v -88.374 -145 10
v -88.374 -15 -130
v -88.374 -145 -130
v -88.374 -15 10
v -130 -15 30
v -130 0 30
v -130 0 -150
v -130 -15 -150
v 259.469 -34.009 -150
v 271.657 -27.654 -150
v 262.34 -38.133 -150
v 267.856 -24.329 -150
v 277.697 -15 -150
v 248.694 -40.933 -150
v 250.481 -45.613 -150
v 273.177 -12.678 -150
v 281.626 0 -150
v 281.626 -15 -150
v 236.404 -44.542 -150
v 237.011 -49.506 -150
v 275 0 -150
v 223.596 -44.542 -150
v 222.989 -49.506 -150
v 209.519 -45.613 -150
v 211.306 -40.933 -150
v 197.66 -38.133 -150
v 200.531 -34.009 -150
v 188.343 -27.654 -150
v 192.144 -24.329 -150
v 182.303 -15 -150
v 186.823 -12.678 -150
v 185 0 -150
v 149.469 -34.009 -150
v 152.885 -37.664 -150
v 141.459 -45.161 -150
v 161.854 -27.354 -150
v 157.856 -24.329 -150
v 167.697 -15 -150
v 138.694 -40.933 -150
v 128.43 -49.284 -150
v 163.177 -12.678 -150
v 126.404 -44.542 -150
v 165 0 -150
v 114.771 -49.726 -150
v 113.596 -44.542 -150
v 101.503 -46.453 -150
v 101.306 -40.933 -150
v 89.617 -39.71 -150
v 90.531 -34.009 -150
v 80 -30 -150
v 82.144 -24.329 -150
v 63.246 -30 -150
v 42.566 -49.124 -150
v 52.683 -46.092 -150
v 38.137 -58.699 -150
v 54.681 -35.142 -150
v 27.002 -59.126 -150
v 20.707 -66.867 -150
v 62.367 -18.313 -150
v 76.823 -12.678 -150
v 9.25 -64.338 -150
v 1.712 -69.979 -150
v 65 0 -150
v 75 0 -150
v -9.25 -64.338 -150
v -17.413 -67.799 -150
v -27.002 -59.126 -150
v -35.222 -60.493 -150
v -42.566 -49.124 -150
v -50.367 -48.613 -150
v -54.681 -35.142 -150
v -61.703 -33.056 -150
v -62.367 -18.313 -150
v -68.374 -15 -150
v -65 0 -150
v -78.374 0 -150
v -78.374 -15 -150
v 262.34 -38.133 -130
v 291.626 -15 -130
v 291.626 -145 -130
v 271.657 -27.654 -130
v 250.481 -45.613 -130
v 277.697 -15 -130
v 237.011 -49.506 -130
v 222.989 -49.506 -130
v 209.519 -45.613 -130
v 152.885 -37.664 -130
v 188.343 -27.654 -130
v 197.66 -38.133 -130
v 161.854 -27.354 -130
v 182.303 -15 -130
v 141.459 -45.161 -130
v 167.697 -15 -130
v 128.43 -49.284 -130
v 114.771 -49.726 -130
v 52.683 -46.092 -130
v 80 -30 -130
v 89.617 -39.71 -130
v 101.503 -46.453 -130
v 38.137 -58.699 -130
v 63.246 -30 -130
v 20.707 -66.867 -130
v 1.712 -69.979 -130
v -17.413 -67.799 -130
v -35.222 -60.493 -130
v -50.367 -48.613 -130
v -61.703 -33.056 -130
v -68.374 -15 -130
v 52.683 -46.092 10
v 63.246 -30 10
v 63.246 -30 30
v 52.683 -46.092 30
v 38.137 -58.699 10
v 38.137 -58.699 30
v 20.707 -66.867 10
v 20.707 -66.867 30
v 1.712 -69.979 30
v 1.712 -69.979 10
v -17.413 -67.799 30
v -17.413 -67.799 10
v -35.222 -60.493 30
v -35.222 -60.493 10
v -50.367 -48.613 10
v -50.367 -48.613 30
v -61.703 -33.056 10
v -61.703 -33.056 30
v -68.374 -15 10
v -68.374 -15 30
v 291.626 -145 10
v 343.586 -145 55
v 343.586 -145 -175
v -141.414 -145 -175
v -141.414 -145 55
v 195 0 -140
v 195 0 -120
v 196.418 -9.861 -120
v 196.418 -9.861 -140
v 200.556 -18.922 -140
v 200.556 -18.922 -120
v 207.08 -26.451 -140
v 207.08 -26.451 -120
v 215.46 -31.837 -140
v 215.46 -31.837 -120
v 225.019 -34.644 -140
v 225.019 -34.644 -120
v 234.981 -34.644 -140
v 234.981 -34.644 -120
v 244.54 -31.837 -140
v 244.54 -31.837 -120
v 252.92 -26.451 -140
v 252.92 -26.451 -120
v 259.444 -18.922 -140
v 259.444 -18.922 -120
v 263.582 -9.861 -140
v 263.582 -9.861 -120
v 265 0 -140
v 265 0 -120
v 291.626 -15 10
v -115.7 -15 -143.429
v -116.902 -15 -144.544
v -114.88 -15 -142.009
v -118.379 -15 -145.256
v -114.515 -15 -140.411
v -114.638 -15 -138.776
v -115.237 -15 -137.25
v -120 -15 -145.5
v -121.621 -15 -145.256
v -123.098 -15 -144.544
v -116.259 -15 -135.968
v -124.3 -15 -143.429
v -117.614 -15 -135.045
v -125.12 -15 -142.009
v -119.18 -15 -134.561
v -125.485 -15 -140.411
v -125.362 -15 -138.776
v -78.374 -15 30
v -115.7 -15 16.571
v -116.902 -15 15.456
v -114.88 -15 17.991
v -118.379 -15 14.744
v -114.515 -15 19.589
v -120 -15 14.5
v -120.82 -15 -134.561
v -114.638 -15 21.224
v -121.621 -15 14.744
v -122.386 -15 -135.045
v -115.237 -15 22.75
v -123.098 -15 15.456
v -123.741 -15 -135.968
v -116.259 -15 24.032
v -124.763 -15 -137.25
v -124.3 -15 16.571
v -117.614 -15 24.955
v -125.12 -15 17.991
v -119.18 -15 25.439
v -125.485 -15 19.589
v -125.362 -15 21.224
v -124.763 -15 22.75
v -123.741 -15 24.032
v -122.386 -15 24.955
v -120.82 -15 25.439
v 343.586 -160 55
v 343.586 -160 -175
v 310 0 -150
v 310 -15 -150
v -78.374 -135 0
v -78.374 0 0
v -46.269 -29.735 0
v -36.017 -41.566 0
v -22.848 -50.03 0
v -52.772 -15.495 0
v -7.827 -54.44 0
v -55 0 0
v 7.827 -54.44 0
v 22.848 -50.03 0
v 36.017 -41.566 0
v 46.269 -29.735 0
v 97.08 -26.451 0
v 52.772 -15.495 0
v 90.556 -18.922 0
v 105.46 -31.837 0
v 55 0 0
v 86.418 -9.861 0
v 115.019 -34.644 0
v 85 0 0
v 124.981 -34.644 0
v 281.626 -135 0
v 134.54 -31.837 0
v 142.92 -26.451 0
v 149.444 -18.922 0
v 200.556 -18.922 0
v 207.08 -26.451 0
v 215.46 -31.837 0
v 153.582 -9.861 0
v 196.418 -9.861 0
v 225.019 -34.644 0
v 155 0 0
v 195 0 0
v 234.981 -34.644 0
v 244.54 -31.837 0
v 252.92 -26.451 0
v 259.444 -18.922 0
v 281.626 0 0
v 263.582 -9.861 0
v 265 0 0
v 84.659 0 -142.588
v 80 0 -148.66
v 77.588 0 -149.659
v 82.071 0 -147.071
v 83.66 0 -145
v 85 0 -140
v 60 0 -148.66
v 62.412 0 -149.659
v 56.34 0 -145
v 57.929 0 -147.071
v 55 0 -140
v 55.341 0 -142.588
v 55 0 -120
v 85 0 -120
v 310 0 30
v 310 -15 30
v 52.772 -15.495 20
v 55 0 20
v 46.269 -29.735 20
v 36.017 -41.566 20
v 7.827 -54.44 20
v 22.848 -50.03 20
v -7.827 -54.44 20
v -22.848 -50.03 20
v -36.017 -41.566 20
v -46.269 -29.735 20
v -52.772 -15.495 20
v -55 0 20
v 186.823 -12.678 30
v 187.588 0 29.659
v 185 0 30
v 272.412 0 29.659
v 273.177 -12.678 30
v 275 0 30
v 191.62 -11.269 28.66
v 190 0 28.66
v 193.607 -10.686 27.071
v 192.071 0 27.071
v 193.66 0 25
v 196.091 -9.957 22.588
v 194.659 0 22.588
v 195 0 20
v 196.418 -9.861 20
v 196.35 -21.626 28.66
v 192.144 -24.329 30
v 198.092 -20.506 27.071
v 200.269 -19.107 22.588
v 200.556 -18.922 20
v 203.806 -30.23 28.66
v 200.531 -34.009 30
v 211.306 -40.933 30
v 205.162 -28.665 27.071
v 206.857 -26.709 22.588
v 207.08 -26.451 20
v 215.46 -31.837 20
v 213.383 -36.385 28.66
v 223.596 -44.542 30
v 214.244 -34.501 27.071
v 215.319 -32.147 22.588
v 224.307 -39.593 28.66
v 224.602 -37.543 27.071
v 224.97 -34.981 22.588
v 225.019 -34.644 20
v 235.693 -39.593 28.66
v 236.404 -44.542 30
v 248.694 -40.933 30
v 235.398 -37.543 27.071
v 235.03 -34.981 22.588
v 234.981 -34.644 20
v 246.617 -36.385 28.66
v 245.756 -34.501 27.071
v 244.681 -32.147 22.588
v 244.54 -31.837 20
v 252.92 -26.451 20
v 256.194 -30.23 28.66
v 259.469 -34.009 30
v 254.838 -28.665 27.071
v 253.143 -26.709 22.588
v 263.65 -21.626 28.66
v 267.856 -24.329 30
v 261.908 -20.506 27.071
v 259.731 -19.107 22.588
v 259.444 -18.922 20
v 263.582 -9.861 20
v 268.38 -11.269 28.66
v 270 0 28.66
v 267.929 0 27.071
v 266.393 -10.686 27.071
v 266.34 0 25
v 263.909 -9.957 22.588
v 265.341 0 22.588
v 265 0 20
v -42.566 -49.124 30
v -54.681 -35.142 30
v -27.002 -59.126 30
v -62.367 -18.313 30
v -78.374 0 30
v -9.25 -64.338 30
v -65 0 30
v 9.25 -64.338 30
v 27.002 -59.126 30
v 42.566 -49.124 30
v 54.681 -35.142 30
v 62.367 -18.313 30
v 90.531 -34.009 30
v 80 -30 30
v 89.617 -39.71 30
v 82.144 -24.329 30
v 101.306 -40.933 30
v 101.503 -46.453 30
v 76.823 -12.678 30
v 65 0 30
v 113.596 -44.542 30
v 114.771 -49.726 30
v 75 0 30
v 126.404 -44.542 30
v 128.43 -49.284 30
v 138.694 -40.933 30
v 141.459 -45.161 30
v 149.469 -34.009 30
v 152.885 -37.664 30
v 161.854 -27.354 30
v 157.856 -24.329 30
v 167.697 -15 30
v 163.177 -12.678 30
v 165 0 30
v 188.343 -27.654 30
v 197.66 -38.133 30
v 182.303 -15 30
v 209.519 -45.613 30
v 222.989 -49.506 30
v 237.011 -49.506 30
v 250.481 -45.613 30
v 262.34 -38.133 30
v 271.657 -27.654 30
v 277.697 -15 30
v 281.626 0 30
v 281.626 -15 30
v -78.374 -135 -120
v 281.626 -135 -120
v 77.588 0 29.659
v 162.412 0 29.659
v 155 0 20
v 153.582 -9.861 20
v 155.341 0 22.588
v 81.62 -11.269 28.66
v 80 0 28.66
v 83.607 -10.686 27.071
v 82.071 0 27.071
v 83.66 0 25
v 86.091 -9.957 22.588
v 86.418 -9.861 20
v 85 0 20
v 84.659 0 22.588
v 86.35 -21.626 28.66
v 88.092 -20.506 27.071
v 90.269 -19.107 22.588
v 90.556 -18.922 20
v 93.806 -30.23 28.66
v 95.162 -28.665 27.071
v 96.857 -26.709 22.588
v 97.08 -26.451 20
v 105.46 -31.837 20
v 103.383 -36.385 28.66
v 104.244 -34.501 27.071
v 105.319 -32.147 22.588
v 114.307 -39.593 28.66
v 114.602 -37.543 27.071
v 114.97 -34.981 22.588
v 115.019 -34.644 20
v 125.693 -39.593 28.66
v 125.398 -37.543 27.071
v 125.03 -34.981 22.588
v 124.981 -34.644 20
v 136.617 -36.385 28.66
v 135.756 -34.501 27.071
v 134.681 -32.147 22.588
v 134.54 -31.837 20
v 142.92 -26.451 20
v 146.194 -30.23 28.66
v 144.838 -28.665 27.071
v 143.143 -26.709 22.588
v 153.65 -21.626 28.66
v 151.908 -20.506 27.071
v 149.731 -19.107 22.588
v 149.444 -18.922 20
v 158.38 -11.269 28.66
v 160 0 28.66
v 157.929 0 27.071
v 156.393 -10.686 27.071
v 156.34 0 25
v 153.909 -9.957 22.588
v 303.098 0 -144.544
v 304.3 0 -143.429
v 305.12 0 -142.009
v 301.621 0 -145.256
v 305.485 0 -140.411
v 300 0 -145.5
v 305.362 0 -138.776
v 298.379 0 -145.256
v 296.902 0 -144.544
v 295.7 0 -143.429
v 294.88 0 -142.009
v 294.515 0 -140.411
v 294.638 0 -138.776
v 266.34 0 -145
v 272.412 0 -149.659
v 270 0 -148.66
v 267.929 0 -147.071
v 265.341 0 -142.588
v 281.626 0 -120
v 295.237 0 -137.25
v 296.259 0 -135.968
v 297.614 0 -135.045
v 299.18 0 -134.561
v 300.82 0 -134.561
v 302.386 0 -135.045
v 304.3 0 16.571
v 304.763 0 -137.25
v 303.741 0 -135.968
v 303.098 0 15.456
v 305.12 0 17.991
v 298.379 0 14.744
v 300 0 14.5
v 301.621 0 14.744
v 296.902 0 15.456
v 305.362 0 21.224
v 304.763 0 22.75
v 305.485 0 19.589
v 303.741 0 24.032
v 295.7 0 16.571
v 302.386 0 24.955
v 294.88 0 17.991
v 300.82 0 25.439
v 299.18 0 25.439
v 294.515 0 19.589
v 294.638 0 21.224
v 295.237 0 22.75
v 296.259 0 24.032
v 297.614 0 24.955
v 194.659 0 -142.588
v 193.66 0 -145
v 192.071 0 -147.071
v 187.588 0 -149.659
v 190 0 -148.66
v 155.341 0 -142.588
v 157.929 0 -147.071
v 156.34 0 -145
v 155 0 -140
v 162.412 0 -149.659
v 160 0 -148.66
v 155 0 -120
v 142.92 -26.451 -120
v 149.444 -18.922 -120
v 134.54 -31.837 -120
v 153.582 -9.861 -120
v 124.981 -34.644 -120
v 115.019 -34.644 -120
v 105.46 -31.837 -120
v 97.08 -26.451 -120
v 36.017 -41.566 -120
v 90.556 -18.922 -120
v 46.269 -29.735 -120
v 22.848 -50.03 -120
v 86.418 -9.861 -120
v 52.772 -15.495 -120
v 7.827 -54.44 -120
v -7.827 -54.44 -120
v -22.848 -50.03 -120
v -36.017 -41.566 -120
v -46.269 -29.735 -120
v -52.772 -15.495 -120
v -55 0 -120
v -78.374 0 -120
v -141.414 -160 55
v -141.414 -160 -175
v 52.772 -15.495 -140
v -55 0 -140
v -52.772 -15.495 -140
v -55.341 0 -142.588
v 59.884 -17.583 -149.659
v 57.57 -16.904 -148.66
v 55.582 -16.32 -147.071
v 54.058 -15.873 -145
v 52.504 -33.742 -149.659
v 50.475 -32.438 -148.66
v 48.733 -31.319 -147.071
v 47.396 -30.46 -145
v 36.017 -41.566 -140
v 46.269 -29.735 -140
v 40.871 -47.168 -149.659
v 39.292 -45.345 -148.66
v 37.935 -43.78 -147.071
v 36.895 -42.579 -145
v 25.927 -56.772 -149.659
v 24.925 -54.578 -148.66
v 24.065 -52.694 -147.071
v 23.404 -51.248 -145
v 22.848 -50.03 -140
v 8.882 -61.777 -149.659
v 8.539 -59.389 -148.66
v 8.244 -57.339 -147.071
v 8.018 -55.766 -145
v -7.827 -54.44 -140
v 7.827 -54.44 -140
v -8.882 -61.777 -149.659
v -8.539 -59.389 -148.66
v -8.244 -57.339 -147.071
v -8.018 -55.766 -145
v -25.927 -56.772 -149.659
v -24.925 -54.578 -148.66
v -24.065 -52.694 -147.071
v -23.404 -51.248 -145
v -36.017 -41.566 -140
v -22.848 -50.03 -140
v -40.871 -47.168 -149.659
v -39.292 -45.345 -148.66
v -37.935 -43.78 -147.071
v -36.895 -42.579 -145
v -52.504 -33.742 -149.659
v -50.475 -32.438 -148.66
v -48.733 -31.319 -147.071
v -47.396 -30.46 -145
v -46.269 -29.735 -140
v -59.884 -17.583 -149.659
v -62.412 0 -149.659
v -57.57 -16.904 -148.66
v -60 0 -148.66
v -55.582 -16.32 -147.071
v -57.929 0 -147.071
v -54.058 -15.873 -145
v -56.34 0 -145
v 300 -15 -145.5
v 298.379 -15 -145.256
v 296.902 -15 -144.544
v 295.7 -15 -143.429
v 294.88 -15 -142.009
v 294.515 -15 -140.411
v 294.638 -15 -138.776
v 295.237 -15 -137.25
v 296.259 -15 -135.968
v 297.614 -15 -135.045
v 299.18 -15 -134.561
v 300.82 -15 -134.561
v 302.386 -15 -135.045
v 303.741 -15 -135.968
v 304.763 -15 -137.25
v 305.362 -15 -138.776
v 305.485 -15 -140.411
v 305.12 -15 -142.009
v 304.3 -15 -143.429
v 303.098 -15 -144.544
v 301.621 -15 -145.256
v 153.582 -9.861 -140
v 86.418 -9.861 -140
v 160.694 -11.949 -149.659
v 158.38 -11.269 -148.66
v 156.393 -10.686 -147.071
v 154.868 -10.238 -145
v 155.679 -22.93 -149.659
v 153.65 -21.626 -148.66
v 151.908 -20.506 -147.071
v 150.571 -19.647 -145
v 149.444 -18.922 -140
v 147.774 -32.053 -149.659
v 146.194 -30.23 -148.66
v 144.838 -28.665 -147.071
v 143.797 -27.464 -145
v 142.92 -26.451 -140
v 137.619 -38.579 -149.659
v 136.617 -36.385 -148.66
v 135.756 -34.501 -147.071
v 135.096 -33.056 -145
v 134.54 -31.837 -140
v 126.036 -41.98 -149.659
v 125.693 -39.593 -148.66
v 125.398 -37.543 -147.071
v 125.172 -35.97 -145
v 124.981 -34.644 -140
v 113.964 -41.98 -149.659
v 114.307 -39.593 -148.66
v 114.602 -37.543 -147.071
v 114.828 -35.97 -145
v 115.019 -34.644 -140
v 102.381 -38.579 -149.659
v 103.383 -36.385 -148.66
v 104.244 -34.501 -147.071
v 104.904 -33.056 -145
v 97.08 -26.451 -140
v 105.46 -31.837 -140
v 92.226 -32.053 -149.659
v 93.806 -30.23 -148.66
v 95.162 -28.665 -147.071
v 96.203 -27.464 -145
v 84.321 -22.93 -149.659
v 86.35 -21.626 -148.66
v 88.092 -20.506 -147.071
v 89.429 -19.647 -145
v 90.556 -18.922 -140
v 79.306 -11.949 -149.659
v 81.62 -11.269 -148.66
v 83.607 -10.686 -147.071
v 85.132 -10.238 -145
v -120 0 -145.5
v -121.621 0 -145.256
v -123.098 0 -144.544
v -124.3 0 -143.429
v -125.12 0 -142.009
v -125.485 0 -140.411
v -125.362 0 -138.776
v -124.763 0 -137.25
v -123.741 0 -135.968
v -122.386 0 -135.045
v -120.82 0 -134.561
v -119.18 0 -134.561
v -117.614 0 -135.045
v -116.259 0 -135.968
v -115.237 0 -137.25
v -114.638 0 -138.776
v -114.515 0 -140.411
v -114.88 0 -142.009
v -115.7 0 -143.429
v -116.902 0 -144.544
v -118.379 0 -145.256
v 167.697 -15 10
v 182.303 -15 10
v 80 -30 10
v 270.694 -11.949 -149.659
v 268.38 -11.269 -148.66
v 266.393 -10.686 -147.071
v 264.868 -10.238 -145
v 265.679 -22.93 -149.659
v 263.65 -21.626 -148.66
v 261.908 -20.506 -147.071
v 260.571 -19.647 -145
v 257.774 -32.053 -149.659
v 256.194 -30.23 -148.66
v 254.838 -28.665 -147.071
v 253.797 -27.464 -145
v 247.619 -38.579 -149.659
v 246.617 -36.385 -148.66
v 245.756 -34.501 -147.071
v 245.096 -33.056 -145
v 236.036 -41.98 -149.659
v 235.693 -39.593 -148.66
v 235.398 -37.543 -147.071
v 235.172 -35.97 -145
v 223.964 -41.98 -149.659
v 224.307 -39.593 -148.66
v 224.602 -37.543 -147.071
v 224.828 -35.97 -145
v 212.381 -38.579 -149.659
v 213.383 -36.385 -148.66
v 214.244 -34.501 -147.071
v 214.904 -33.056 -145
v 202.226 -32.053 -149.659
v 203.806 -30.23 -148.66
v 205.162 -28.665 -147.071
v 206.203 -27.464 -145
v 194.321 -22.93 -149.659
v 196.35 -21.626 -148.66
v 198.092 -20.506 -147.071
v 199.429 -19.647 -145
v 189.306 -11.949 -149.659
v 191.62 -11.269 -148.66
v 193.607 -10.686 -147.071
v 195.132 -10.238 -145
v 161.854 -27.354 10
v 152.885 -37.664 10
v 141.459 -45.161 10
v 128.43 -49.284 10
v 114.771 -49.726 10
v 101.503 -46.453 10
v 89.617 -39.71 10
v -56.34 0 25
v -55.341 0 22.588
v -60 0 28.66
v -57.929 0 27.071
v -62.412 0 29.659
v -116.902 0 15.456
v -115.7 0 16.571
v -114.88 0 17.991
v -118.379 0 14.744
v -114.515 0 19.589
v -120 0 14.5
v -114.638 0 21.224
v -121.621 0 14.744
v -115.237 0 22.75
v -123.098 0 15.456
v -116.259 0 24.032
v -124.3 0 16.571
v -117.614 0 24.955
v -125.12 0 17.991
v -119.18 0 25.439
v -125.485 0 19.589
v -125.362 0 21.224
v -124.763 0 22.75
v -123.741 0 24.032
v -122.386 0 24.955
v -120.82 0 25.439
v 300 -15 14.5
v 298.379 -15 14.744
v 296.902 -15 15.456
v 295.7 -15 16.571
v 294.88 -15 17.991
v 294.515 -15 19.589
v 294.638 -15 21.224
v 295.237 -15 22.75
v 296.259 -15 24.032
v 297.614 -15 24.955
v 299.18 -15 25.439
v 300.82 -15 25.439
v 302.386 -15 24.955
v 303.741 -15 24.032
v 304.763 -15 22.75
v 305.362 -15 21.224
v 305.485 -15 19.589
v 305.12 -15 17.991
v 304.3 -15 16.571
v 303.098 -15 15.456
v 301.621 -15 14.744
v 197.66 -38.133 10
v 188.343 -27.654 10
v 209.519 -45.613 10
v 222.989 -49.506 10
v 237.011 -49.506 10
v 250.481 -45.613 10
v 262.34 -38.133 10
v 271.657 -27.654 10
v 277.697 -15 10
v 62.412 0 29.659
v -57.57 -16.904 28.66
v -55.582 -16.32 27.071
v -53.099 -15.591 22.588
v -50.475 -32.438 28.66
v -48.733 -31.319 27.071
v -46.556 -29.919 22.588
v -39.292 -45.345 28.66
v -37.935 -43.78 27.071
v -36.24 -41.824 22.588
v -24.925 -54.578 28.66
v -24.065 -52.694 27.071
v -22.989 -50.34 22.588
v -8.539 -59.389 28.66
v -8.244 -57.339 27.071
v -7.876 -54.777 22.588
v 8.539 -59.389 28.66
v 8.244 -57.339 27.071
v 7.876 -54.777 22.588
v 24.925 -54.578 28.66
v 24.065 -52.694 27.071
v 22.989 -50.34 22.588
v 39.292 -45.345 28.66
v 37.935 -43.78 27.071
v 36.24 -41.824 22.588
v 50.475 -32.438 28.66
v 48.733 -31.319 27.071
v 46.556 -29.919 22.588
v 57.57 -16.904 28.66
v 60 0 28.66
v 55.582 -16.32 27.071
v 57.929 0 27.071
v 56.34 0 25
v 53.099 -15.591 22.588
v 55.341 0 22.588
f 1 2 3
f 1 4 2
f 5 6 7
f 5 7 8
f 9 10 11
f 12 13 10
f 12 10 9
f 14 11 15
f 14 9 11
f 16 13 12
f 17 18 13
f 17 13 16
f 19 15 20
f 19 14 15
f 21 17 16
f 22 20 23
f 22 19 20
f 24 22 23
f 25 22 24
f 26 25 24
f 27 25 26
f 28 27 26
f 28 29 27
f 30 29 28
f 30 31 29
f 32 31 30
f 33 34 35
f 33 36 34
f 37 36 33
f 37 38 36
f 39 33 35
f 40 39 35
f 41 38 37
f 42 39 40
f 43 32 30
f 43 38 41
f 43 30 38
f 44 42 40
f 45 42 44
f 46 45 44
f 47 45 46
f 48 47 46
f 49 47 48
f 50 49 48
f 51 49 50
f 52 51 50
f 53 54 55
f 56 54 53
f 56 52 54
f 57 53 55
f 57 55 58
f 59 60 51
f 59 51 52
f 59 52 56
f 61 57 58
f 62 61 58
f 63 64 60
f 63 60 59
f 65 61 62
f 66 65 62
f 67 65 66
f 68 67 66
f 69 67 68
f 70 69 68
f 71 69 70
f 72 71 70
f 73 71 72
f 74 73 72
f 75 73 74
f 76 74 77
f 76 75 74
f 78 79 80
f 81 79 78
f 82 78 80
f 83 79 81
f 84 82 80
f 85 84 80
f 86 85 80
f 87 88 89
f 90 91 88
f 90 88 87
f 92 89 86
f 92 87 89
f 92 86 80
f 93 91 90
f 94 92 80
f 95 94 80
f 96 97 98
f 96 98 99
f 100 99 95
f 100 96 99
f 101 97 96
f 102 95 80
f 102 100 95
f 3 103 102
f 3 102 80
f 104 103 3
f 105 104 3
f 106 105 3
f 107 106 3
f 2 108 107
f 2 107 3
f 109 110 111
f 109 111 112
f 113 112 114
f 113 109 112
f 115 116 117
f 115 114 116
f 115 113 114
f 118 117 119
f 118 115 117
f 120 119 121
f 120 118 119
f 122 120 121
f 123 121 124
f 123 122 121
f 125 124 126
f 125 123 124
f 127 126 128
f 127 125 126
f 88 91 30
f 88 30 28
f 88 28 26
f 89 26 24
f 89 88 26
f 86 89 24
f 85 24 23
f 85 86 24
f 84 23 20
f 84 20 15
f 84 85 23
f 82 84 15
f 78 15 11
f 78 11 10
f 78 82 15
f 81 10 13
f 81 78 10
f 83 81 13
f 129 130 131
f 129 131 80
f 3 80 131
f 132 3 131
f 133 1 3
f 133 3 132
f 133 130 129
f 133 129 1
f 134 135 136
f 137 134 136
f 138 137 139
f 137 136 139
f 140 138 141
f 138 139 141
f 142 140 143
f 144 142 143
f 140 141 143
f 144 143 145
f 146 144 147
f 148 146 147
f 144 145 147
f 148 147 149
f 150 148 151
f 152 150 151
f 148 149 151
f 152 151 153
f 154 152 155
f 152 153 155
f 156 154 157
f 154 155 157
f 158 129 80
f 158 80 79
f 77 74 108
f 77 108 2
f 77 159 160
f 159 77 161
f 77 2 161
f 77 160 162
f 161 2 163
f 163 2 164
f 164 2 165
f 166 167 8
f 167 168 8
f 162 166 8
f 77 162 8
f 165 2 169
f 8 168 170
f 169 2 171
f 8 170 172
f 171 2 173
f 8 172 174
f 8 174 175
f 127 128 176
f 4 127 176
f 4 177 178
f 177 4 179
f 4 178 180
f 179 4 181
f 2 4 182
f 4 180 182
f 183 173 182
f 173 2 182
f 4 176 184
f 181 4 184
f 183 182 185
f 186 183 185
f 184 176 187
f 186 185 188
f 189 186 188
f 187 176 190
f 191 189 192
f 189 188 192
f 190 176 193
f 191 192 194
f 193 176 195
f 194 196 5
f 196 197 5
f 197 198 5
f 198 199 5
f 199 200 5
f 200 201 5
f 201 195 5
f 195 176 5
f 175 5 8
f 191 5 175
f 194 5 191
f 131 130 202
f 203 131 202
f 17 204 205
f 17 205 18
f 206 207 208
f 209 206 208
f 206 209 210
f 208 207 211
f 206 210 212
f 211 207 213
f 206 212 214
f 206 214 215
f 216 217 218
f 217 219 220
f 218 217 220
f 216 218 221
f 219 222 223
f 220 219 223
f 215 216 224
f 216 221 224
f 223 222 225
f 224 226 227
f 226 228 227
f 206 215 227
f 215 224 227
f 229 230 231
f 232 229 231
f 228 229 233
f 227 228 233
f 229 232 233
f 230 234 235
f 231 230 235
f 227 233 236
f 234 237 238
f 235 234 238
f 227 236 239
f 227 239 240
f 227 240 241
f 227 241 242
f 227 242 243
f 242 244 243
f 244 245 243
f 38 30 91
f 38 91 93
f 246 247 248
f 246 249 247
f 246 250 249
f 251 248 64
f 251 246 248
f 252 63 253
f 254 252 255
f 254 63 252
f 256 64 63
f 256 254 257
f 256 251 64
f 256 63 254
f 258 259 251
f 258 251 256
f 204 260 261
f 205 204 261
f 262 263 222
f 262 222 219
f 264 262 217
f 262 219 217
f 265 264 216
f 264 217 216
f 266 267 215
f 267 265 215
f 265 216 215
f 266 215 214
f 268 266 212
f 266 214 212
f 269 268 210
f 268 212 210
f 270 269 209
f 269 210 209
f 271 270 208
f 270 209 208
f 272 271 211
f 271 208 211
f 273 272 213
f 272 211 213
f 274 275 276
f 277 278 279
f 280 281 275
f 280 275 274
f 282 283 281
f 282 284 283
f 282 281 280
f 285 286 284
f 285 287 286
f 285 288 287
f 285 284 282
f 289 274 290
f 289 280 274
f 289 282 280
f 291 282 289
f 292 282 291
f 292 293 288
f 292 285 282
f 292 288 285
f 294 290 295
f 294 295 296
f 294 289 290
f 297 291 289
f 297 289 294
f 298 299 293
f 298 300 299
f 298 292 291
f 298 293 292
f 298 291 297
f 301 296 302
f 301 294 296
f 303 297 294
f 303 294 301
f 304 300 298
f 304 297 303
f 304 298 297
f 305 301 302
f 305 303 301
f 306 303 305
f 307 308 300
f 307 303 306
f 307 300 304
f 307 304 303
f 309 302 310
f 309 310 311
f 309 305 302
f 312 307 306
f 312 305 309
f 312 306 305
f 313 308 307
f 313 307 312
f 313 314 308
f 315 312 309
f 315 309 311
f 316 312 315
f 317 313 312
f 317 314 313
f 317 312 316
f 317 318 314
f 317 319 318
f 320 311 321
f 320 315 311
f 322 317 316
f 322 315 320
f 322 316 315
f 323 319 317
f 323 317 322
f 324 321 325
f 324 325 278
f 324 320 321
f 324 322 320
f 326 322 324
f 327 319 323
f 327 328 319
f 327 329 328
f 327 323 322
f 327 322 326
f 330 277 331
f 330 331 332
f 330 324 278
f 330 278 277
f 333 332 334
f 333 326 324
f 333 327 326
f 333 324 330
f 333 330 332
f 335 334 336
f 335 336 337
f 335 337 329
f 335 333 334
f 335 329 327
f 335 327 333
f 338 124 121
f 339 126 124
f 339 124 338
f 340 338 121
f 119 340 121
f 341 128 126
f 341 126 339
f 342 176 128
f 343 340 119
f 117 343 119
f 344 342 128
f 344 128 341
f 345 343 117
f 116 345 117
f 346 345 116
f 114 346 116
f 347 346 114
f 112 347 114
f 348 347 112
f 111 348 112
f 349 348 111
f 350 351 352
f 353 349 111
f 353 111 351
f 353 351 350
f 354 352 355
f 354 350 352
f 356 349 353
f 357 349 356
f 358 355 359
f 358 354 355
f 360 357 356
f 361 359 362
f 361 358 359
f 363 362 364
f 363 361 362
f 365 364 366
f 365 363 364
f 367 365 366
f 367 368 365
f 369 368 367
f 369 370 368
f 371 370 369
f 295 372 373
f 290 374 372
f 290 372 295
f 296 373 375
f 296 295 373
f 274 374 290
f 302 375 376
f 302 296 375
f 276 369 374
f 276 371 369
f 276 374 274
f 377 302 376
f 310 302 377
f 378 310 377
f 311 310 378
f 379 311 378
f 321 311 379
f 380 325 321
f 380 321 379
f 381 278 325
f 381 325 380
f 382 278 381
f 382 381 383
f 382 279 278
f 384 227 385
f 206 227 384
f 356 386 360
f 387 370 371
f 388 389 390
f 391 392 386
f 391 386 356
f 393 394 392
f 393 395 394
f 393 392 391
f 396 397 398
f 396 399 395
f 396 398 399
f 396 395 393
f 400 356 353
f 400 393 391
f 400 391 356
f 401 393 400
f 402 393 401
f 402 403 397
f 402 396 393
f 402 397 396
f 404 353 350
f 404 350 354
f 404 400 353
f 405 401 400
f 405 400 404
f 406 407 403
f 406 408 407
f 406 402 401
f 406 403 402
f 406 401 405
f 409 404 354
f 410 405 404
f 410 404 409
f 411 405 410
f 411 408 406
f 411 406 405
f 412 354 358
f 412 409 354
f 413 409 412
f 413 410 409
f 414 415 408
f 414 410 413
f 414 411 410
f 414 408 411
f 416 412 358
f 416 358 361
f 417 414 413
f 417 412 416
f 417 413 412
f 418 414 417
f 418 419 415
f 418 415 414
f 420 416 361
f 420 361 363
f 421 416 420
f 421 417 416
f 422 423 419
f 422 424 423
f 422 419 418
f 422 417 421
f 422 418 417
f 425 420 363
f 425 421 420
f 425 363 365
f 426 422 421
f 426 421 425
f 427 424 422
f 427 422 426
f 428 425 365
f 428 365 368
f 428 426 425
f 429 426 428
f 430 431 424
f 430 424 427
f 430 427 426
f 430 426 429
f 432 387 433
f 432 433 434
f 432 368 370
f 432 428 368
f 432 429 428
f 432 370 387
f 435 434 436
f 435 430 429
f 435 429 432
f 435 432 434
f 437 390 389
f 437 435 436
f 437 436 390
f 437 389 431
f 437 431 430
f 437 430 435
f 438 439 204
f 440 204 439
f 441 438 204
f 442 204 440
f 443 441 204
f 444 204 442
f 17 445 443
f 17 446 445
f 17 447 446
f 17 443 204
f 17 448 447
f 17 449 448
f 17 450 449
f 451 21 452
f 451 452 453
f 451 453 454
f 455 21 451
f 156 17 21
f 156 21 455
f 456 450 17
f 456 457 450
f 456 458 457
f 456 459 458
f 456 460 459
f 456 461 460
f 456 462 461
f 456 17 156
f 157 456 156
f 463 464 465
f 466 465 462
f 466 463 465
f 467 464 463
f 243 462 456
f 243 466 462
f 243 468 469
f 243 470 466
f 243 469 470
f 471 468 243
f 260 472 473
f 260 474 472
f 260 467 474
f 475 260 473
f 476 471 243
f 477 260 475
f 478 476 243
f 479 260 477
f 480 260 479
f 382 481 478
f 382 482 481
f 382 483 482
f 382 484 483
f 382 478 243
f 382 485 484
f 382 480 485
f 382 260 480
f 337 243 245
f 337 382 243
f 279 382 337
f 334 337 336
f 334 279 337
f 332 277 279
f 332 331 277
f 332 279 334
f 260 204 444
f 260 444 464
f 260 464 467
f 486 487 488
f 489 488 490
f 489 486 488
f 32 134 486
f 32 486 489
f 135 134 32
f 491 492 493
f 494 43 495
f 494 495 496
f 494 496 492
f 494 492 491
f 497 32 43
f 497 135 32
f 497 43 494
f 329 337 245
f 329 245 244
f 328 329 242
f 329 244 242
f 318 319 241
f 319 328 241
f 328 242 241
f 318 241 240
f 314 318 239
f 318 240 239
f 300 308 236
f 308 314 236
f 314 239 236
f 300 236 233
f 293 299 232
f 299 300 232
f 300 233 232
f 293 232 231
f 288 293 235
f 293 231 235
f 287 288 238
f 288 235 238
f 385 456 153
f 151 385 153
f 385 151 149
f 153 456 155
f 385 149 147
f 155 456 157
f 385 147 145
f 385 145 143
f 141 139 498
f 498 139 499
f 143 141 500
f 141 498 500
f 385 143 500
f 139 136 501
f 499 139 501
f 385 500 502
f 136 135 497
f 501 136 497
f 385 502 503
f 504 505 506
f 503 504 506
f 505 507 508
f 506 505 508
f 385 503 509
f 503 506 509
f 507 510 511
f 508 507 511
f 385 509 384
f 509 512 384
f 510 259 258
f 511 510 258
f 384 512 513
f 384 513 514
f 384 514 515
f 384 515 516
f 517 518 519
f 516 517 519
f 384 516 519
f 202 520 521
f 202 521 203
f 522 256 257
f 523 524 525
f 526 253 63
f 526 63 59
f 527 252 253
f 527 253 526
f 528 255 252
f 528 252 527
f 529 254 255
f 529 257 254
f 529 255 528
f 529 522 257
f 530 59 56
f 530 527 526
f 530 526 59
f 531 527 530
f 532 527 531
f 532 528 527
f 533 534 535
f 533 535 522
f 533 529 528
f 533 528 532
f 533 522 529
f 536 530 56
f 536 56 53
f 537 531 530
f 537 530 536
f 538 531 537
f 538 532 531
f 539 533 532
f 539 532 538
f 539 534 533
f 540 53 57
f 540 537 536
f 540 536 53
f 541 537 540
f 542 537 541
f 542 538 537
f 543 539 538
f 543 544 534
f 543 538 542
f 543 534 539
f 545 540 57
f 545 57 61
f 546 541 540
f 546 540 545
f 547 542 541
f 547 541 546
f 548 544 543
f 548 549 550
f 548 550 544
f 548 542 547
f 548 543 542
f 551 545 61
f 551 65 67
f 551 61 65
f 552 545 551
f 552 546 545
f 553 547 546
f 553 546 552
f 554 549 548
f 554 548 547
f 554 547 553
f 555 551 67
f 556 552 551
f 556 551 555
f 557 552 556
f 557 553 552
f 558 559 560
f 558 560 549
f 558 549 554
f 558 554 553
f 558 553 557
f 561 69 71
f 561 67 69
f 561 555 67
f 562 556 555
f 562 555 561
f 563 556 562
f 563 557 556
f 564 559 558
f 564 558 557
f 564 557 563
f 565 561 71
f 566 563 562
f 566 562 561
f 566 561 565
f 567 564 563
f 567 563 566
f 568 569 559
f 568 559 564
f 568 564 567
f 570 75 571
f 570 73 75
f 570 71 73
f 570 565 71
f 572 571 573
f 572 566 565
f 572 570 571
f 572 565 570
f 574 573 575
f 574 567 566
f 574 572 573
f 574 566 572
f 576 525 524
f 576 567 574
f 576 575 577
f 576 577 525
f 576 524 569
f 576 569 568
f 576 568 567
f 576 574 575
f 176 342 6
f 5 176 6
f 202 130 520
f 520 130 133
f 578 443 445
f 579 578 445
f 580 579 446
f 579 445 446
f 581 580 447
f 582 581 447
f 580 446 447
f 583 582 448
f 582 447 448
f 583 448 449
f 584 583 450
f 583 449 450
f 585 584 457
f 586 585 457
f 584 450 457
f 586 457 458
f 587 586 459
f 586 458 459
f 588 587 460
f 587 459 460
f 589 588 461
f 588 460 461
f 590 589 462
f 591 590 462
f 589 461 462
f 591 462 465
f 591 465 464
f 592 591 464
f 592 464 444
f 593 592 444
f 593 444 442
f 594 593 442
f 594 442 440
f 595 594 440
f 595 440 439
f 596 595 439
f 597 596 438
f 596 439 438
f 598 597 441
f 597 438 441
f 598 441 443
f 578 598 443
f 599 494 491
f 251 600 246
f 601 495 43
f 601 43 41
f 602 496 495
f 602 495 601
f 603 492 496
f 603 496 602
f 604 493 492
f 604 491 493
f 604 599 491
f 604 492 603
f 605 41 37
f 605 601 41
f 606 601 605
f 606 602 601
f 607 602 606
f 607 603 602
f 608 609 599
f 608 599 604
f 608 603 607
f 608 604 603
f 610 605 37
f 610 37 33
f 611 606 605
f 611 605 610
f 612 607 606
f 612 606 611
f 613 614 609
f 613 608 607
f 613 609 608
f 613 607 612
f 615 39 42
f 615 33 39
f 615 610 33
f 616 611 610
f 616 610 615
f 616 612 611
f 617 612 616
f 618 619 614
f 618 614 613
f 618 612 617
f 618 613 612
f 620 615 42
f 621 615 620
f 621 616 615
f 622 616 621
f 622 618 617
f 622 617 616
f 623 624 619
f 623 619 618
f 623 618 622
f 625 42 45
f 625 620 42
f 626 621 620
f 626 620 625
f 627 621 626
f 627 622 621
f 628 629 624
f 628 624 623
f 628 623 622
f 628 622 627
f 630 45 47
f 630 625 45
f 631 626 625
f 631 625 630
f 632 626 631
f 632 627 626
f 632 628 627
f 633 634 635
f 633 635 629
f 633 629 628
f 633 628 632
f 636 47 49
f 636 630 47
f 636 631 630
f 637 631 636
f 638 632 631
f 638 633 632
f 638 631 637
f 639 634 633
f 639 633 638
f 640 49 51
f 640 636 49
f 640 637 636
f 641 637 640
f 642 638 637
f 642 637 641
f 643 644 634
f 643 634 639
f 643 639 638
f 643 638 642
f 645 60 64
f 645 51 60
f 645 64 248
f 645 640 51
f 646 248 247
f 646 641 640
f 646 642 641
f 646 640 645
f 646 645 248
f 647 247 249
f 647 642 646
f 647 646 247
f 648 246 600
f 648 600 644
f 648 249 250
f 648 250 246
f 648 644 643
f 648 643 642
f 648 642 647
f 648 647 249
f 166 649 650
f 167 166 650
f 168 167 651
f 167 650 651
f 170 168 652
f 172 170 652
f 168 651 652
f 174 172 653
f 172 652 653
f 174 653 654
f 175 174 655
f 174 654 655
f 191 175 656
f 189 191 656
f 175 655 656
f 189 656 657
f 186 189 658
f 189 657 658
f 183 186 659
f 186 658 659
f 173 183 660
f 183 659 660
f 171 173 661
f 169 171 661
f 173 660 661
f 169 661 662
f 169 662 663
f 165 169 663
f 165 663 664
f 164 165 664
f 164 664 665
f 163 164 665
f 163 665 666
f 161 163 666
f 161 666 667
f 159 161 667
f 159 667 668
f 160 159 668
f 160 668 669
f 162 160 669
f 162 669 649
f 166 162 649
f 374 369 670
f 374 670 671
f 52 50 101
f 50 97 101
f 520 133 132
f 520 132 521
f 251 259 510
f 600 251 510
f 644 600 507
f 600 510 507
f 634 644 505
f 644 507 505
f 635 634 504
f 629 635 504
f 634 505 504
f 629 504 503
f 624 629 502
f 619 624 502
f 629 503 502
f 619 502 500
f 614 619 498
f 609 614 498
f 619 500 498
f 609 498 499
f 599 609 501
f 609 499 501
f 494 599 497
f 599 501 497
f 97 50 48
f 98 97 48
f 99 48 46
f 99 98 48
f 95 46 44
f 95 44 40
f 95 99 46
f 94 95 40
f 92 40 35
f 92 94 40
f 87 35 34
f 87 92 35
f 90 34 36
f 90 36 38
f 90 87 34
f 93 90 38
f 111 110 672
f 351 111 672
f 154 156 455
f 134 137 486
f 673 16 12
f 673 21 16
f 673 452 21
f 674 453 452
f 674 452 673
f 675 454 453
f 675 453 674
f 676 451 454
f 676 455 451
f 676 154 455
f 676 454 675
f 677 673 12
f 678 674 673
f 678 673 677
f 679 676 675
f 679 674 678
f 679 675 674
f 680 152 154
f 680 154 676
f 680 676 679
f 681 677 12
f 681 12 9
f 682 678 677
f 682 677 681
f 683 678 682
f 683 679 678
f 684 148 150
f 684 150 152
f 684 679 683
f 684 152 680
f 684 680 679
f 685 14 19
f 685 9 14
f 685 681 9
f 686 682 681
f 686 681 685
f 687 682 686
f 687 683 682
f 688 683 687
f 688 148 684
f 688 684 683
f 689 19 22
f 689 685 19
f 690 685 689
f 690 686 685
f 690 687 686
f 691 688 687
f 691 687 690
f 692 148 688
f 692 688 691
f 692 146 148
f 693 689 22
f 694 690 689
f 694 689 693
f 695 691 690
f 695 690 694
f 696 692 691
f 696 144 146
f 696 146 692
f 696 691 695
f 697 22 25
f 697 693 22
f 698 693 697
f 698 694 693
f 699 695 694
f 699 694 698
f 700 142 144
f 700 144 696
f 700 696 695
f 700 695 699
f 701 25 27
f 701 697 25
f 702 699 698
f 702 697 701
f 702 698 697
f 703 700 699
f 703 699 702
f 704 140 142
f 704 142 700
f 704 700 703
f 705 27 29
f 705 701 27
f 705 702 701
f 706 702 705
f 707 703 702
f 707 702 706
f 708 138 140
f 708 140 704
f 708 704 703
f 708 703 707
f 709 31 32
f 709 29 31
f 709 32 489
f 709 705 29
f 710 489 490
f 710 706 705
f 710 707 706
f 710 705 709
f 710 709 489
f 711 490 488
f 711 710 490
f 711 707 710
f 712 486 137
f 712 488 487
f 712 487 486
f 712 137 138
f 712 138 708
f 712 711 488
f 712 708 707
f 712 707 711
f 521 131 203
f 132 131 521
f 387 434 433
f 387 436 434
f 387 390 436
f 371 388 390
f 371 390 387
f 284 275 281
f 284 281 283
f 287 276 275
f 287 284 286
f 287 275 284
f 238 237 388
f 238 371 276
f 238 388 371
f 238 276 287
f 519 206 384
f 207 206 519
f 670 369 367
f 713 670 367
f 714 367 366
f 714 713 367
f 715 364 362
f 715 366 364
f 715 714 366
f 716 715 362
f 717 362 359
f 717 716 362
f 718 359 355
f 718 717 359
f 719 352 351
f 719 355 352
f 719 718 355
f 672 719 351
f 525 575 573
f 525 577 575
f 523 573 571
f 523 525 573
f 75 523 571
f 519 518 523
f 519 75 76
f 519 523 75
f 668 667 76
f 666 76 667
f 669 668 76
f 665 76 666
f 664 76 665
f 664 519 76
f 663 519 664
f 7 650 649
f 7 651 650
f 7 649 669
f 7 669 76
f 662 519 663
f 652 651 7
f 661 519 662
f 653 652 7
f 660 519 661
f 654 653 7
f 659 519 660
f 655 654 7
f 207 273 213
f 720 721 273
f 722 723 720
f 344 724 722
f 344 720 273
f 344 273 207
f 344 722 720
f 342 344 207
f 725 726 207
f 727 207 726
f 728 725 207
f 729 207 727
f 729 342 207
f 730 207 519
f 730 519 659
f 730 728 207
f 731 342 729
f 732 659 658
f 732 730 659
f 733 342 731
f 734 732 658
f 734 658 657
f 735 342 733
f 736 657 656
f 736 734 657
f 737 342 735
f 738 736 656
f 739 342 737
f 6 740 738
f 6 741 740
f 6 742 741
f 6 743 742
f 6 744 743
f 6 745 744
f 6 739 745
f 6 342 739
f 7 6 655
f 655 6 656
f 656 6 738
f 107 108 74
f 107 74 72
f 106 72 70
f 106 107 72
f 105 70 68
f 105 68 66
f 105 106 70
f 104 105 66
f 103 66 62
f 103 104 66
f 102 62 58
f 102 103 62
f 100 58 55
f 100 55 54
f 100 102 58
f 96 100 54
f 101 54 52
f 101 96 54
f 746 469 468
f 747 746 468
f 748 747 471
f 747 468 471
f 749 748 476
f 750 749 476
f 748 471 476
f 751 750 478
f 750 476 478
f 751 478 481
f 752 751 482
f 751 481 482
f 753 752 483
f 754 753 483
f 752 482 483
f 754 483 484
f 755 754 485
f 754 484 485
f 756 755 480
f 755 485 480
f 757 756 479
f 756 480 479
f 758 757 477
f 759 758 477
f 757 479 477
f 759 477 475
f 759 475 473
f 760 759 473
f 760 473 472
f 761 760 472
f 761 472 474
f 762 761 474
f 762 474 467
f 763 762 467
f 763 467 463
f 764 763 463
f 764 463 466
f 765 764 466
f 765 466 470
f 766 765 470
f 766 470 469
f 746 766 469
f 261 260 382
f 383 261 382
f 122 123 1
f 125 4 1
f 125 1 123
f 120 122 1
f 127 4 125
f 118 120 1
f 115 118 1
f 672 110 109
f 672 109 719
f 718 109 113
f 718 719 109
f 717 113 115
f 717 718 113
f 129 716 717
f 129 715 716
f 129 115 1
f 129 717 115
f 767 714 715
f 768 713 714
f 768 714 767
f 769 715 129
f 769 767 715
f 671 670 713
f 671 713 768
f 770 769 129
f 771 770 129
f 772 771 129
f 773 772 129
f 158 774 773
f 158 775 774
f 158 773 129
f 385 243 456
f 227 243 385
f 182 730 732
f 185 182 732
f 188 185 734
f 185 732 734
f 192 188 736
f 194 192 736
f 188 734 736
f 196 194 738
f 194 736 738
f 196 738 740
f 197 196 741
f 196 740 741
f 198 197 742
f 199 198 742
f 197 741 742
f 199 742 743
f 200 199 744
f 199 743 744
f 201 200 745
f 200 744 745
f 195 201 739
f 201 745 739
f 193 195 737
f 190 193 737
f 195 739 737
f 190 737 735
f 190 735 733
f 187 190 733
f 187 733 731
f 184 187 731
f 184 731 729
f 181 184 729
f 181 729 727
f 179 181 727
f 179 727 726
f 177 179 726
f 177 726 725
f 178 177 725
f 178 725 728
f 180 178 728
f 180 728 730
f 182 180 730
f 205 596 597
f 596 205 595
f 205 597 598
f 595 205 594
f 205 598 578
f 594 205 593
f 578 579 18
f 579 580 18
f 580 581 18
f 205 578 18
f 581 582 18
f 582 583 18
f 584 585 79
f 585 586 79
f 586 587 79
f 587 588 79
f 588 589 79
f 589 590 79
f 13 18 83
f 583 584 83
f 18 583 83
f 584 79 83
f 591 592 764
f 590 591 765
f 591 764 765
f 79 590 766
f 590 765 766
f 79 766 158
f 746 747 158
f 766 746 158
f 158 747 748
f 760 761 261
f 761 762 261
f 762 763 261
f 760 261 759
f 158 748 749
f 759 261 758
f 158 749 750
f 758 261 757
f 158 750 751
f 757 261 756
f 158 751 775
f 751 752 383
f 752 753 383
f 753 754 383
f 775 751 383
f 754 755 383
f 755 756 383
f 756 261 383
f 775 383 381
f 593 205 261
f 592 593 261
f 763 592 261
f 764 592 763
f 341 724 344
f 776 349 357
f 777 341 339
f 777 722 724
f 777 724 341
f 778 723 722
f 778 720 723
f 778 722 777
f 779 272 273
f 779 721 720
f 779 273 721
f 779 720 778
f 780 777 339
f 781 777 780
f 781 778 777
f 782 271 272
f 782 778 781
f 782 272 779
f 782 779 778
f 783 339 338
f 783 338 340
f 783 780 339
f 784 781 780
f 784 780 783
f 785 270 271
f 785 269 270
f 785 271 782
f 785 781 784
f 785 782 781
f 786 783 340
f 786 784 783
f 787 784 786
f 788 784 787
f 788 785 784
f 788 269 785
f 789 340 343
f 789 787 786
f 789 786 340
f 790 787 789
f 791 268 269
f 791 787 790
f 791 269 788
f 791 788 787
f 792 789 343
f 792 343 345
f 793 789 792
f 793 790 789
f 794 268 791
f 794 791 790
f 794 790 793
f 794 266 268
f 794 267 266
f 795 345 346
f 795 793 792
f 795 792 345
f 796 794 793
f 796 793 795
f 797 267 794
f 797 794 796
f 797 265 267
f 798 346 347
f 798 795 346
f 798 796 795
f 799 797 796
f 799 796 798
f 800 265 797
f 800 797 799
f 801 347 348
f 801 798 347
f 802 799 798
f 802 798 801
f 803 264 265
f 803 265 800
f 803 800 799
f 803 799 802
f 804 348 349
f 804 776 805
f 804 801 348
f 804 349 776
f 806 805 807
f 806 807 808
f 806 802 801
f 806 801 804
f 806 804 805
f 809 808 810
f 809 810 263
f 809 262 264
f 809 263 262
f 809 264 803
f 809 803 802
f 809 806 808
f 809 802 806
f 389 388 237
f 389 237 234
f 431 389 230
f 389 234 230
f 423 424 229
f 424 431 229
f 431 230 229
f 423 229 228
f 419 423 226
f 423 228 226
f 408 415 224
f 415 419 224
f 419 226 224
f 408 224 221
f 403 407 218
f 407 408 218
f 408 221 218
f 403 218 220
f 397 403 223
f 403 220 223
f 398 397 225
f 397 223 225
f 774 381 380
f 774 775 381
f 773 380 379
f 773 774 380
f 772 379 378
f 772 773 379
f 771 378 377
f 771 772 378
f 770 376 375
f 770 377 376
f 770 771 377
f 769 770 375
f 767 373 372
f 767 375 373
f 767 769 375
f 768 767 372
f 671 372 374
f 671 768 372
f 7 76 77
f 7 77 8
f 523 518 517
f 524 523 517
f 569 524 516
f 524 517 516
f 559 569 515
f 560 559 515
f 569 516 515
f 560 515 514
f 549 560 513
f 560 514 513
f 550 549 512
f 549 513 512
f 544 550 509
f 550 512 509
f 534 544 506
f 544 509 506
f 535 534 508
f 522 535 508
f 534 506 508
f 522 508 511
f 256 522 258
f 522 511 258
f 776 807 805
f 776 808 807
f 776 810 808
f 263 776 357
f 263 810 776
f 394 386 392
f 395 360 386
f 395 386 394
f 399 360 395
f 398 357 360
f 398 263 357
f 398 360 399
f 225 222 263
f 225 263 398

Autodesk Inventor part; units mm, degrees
ref_plane "YZ Plane" through (0, 0, 0) normal (1, 0, 0) x (0, 1, 0)
ref_plane "XZ Plane" through (0, 0, 0) normal (0, 1, 0) x (-1, 0, 0)
sketch "Sketch1" plane through (0, 0, 0) normal (0, 0, 1) x (1, 0, 0)
  arc A0 (-55, 0) -> (55, 0) centre (0, 0) ccw
  arc A1 (-70, 0) -> (63.2456, -30) centre (0, 0) ccw
  arc A2 (85, 0) -> (155, 0) centre (120, 0) ccw
  arc A3 (80, -30) -> (167.697, -15) centre (120, 0) ccw
  arc A4 (195, 0) -> (265, 0) centre (230, 0) ccw
  arc A5 (182.303, -15) -> (277.697, -15) centre (230, 0) ccw
  line L0 (-130, 0) -> (-130, -15)
  line L1 (310, -15) -> (310, 0)
  line L2 (-130, -15) -> (-68.374, -15)
  line L3 (-130, 0) -> (-55, 0)
  line L4 (63.2456, -30) -> (80, -30)
  line L5 (167.697, -15) -> (182.303, -15)
  line L6 (277.697, -15) -> (310, -15)
  line L7 (265, 0) -> (310, 0)
  line L8 (55, 0) -> (85, 0)
  line L9 (155, 0) -> (195, 0)
  line L10 (-88.374, -15) -> (-88.374, -145)
  line L11 (-88.374, -145) -> (291.626, -145)
  line L12 (291.626, -145) -> (291.626, -15)
  dimension "d0" = 110
  dimension "d1" = 140
  dimension "d2" = 70
  dimension "d3" = 100
  dimension "d4" = 70
  dimension "d5" = 100
  dimension "d8" = 440
  dimension "d9" = 130
  dimension "d10" = 15
  dimension "d12" = 130
  dimension "d13" = 380
  dimension "d14" = 20
extrude "Extrusion1" add sketch "Sketch1" along normal blind 30 contours A0 L8 A2 L9 A4 L7 L1 L6 A5 L5 A3 L4 A1 L3 | A1 L2 L0 L3
extrude "Extrusion2" add sketch "Sketch1" along normal blind 10 contours A1 L4 A3 L5 A5 L6 L12 L11 L10 L2
sketch "Sketch2" plane through (0, 0, 0) normal (0, 0, -1) x (-1, 0, 0)
  line L0 (-291.626, -145) -> (-291.626, -15) projected
  line L1 (88.374, -145) -> (-291.626, -145) projected
  line L2 (88.374, -15) -> (88.374, -145) projected
  line L3 (-281.626, -15) -> (-281.626, -135)
  line L4 (-281.626, -135) -> (78.374, -135)
  line L5 (78.374, -135) -> (78.374, -15)
  line L6 (-291.626, -15) -> (-310, -15) projected
  line L7 (130, -15) -> (88.374, -15) projected
  line L8 (-291.626, -15) -> (-281.626, -15)
  line L9 (78.374, -15) -> (88.374, -15)
  point P0 (0, 0)
  dimension "d19" = 10
extrude "Extrusion3" add sketch "Sketch2" along normal blind 130
ref_plane "Work Plane1" through (0, 0, -60) normal (0, 0, -1) x (-1, 0, 0)
mirror "Mirror1" about plane through (0, 0, -60) normal (0, 0, -1) of "Extrusion1", "Extrusion2"
sketch "Sketch3" plane through (0, 0, -60) normal (0, 0, -1) x (-1, 0, 0)
  line L0 (78.374, -135) -> (78.374, -15) projected
  line L1 (130, 0) -> (130, -15) projected
  line L2 (78.374, -15) -> (130, -15)
  line L3 (130, -15) -> (130, 0)
  line L4 (130, 0) -> (78.374, 0)
  line L5 (78.374, 0) -> (78.374, -15)
  line L6 (-281.626, -15) -> (-281.626, -135) projected
  line L7 (-310, 0) -> (-265, 0) projected
  line L8 (-281.626, -15) -> (-310, -15)
  line L9 (-310, -15) -> (-310, 0)
  line L10 (-310, 0) -> (-281.626, 0)
  line L11 (-281.626, 0) -> (-281.626, -15)
  point P0 (0, 0)
extrude "Extrusion4" add sketch "Sketch3" along normal through all both and the other way through all
sketch "Sketch4" plane through (0, 0, -60) normal (0, 0, -1) x (-1, 0, 0)
  line L0 (-291.626, -15) -> (-291.626, -145) projected
  line L1 (-343.586, -145) -> (141.414, -145)
  line L2 (141.414, -145) -> (141.414, -160)
  line L3 (141.414, -160) -> (-343.586, -160)
  line L4 (-343.586, -145) -> (-343.586, -160)
  point P0 (0, 0)
  dimension "d29" = 51.96
  dimension "d30" = 485
  dimension "d31" = 15
extrude "Extrusion5" add sketch "Sketch4" along normal mid plane 230
fillet "Fillet1" radius 10 6 edges at (0, -55, 30) (120, -35, 30) (230, -35, 30) (230, -35, -150) (120, -35, -150) (0, -55, -150)
sketch "Sketch5" plane through (-130, -15, 30) normal (0, -1, 0) x (1, 0, 0)
  point P0 (10, -10)
hole "Hole1" at (-120, -15, 20) direction (0, 1, 0) diameter 11 depth 15
sketch "Sketch6" plane through (-130, -15, 30) normal (0, -1, 0) x (1, 0, 0)
  point P0 (10, -170)
hole "Hole2" at (-120, -15, -140) direction (0, 1, 0) diameter 11 depth 15
sketch "Sketch7" plane through (277.697, -15, 30) normal (0, -1, 0) x (1, 0, 0)
  point P0 (22.303, -10)
hole "Hole3" at (300, -15, 20) direction (0, 1, 0) diameter 11 depth 15
sketch "Sketch8" plane through (277.697, -15, 30) normal (0, -1, 0) x (1, 0, 0)
  point P0 (22.303, -170)
hole "Hole4" at (300, -15, -140) direction (0, 1, 0) diameter 11 depth 15
